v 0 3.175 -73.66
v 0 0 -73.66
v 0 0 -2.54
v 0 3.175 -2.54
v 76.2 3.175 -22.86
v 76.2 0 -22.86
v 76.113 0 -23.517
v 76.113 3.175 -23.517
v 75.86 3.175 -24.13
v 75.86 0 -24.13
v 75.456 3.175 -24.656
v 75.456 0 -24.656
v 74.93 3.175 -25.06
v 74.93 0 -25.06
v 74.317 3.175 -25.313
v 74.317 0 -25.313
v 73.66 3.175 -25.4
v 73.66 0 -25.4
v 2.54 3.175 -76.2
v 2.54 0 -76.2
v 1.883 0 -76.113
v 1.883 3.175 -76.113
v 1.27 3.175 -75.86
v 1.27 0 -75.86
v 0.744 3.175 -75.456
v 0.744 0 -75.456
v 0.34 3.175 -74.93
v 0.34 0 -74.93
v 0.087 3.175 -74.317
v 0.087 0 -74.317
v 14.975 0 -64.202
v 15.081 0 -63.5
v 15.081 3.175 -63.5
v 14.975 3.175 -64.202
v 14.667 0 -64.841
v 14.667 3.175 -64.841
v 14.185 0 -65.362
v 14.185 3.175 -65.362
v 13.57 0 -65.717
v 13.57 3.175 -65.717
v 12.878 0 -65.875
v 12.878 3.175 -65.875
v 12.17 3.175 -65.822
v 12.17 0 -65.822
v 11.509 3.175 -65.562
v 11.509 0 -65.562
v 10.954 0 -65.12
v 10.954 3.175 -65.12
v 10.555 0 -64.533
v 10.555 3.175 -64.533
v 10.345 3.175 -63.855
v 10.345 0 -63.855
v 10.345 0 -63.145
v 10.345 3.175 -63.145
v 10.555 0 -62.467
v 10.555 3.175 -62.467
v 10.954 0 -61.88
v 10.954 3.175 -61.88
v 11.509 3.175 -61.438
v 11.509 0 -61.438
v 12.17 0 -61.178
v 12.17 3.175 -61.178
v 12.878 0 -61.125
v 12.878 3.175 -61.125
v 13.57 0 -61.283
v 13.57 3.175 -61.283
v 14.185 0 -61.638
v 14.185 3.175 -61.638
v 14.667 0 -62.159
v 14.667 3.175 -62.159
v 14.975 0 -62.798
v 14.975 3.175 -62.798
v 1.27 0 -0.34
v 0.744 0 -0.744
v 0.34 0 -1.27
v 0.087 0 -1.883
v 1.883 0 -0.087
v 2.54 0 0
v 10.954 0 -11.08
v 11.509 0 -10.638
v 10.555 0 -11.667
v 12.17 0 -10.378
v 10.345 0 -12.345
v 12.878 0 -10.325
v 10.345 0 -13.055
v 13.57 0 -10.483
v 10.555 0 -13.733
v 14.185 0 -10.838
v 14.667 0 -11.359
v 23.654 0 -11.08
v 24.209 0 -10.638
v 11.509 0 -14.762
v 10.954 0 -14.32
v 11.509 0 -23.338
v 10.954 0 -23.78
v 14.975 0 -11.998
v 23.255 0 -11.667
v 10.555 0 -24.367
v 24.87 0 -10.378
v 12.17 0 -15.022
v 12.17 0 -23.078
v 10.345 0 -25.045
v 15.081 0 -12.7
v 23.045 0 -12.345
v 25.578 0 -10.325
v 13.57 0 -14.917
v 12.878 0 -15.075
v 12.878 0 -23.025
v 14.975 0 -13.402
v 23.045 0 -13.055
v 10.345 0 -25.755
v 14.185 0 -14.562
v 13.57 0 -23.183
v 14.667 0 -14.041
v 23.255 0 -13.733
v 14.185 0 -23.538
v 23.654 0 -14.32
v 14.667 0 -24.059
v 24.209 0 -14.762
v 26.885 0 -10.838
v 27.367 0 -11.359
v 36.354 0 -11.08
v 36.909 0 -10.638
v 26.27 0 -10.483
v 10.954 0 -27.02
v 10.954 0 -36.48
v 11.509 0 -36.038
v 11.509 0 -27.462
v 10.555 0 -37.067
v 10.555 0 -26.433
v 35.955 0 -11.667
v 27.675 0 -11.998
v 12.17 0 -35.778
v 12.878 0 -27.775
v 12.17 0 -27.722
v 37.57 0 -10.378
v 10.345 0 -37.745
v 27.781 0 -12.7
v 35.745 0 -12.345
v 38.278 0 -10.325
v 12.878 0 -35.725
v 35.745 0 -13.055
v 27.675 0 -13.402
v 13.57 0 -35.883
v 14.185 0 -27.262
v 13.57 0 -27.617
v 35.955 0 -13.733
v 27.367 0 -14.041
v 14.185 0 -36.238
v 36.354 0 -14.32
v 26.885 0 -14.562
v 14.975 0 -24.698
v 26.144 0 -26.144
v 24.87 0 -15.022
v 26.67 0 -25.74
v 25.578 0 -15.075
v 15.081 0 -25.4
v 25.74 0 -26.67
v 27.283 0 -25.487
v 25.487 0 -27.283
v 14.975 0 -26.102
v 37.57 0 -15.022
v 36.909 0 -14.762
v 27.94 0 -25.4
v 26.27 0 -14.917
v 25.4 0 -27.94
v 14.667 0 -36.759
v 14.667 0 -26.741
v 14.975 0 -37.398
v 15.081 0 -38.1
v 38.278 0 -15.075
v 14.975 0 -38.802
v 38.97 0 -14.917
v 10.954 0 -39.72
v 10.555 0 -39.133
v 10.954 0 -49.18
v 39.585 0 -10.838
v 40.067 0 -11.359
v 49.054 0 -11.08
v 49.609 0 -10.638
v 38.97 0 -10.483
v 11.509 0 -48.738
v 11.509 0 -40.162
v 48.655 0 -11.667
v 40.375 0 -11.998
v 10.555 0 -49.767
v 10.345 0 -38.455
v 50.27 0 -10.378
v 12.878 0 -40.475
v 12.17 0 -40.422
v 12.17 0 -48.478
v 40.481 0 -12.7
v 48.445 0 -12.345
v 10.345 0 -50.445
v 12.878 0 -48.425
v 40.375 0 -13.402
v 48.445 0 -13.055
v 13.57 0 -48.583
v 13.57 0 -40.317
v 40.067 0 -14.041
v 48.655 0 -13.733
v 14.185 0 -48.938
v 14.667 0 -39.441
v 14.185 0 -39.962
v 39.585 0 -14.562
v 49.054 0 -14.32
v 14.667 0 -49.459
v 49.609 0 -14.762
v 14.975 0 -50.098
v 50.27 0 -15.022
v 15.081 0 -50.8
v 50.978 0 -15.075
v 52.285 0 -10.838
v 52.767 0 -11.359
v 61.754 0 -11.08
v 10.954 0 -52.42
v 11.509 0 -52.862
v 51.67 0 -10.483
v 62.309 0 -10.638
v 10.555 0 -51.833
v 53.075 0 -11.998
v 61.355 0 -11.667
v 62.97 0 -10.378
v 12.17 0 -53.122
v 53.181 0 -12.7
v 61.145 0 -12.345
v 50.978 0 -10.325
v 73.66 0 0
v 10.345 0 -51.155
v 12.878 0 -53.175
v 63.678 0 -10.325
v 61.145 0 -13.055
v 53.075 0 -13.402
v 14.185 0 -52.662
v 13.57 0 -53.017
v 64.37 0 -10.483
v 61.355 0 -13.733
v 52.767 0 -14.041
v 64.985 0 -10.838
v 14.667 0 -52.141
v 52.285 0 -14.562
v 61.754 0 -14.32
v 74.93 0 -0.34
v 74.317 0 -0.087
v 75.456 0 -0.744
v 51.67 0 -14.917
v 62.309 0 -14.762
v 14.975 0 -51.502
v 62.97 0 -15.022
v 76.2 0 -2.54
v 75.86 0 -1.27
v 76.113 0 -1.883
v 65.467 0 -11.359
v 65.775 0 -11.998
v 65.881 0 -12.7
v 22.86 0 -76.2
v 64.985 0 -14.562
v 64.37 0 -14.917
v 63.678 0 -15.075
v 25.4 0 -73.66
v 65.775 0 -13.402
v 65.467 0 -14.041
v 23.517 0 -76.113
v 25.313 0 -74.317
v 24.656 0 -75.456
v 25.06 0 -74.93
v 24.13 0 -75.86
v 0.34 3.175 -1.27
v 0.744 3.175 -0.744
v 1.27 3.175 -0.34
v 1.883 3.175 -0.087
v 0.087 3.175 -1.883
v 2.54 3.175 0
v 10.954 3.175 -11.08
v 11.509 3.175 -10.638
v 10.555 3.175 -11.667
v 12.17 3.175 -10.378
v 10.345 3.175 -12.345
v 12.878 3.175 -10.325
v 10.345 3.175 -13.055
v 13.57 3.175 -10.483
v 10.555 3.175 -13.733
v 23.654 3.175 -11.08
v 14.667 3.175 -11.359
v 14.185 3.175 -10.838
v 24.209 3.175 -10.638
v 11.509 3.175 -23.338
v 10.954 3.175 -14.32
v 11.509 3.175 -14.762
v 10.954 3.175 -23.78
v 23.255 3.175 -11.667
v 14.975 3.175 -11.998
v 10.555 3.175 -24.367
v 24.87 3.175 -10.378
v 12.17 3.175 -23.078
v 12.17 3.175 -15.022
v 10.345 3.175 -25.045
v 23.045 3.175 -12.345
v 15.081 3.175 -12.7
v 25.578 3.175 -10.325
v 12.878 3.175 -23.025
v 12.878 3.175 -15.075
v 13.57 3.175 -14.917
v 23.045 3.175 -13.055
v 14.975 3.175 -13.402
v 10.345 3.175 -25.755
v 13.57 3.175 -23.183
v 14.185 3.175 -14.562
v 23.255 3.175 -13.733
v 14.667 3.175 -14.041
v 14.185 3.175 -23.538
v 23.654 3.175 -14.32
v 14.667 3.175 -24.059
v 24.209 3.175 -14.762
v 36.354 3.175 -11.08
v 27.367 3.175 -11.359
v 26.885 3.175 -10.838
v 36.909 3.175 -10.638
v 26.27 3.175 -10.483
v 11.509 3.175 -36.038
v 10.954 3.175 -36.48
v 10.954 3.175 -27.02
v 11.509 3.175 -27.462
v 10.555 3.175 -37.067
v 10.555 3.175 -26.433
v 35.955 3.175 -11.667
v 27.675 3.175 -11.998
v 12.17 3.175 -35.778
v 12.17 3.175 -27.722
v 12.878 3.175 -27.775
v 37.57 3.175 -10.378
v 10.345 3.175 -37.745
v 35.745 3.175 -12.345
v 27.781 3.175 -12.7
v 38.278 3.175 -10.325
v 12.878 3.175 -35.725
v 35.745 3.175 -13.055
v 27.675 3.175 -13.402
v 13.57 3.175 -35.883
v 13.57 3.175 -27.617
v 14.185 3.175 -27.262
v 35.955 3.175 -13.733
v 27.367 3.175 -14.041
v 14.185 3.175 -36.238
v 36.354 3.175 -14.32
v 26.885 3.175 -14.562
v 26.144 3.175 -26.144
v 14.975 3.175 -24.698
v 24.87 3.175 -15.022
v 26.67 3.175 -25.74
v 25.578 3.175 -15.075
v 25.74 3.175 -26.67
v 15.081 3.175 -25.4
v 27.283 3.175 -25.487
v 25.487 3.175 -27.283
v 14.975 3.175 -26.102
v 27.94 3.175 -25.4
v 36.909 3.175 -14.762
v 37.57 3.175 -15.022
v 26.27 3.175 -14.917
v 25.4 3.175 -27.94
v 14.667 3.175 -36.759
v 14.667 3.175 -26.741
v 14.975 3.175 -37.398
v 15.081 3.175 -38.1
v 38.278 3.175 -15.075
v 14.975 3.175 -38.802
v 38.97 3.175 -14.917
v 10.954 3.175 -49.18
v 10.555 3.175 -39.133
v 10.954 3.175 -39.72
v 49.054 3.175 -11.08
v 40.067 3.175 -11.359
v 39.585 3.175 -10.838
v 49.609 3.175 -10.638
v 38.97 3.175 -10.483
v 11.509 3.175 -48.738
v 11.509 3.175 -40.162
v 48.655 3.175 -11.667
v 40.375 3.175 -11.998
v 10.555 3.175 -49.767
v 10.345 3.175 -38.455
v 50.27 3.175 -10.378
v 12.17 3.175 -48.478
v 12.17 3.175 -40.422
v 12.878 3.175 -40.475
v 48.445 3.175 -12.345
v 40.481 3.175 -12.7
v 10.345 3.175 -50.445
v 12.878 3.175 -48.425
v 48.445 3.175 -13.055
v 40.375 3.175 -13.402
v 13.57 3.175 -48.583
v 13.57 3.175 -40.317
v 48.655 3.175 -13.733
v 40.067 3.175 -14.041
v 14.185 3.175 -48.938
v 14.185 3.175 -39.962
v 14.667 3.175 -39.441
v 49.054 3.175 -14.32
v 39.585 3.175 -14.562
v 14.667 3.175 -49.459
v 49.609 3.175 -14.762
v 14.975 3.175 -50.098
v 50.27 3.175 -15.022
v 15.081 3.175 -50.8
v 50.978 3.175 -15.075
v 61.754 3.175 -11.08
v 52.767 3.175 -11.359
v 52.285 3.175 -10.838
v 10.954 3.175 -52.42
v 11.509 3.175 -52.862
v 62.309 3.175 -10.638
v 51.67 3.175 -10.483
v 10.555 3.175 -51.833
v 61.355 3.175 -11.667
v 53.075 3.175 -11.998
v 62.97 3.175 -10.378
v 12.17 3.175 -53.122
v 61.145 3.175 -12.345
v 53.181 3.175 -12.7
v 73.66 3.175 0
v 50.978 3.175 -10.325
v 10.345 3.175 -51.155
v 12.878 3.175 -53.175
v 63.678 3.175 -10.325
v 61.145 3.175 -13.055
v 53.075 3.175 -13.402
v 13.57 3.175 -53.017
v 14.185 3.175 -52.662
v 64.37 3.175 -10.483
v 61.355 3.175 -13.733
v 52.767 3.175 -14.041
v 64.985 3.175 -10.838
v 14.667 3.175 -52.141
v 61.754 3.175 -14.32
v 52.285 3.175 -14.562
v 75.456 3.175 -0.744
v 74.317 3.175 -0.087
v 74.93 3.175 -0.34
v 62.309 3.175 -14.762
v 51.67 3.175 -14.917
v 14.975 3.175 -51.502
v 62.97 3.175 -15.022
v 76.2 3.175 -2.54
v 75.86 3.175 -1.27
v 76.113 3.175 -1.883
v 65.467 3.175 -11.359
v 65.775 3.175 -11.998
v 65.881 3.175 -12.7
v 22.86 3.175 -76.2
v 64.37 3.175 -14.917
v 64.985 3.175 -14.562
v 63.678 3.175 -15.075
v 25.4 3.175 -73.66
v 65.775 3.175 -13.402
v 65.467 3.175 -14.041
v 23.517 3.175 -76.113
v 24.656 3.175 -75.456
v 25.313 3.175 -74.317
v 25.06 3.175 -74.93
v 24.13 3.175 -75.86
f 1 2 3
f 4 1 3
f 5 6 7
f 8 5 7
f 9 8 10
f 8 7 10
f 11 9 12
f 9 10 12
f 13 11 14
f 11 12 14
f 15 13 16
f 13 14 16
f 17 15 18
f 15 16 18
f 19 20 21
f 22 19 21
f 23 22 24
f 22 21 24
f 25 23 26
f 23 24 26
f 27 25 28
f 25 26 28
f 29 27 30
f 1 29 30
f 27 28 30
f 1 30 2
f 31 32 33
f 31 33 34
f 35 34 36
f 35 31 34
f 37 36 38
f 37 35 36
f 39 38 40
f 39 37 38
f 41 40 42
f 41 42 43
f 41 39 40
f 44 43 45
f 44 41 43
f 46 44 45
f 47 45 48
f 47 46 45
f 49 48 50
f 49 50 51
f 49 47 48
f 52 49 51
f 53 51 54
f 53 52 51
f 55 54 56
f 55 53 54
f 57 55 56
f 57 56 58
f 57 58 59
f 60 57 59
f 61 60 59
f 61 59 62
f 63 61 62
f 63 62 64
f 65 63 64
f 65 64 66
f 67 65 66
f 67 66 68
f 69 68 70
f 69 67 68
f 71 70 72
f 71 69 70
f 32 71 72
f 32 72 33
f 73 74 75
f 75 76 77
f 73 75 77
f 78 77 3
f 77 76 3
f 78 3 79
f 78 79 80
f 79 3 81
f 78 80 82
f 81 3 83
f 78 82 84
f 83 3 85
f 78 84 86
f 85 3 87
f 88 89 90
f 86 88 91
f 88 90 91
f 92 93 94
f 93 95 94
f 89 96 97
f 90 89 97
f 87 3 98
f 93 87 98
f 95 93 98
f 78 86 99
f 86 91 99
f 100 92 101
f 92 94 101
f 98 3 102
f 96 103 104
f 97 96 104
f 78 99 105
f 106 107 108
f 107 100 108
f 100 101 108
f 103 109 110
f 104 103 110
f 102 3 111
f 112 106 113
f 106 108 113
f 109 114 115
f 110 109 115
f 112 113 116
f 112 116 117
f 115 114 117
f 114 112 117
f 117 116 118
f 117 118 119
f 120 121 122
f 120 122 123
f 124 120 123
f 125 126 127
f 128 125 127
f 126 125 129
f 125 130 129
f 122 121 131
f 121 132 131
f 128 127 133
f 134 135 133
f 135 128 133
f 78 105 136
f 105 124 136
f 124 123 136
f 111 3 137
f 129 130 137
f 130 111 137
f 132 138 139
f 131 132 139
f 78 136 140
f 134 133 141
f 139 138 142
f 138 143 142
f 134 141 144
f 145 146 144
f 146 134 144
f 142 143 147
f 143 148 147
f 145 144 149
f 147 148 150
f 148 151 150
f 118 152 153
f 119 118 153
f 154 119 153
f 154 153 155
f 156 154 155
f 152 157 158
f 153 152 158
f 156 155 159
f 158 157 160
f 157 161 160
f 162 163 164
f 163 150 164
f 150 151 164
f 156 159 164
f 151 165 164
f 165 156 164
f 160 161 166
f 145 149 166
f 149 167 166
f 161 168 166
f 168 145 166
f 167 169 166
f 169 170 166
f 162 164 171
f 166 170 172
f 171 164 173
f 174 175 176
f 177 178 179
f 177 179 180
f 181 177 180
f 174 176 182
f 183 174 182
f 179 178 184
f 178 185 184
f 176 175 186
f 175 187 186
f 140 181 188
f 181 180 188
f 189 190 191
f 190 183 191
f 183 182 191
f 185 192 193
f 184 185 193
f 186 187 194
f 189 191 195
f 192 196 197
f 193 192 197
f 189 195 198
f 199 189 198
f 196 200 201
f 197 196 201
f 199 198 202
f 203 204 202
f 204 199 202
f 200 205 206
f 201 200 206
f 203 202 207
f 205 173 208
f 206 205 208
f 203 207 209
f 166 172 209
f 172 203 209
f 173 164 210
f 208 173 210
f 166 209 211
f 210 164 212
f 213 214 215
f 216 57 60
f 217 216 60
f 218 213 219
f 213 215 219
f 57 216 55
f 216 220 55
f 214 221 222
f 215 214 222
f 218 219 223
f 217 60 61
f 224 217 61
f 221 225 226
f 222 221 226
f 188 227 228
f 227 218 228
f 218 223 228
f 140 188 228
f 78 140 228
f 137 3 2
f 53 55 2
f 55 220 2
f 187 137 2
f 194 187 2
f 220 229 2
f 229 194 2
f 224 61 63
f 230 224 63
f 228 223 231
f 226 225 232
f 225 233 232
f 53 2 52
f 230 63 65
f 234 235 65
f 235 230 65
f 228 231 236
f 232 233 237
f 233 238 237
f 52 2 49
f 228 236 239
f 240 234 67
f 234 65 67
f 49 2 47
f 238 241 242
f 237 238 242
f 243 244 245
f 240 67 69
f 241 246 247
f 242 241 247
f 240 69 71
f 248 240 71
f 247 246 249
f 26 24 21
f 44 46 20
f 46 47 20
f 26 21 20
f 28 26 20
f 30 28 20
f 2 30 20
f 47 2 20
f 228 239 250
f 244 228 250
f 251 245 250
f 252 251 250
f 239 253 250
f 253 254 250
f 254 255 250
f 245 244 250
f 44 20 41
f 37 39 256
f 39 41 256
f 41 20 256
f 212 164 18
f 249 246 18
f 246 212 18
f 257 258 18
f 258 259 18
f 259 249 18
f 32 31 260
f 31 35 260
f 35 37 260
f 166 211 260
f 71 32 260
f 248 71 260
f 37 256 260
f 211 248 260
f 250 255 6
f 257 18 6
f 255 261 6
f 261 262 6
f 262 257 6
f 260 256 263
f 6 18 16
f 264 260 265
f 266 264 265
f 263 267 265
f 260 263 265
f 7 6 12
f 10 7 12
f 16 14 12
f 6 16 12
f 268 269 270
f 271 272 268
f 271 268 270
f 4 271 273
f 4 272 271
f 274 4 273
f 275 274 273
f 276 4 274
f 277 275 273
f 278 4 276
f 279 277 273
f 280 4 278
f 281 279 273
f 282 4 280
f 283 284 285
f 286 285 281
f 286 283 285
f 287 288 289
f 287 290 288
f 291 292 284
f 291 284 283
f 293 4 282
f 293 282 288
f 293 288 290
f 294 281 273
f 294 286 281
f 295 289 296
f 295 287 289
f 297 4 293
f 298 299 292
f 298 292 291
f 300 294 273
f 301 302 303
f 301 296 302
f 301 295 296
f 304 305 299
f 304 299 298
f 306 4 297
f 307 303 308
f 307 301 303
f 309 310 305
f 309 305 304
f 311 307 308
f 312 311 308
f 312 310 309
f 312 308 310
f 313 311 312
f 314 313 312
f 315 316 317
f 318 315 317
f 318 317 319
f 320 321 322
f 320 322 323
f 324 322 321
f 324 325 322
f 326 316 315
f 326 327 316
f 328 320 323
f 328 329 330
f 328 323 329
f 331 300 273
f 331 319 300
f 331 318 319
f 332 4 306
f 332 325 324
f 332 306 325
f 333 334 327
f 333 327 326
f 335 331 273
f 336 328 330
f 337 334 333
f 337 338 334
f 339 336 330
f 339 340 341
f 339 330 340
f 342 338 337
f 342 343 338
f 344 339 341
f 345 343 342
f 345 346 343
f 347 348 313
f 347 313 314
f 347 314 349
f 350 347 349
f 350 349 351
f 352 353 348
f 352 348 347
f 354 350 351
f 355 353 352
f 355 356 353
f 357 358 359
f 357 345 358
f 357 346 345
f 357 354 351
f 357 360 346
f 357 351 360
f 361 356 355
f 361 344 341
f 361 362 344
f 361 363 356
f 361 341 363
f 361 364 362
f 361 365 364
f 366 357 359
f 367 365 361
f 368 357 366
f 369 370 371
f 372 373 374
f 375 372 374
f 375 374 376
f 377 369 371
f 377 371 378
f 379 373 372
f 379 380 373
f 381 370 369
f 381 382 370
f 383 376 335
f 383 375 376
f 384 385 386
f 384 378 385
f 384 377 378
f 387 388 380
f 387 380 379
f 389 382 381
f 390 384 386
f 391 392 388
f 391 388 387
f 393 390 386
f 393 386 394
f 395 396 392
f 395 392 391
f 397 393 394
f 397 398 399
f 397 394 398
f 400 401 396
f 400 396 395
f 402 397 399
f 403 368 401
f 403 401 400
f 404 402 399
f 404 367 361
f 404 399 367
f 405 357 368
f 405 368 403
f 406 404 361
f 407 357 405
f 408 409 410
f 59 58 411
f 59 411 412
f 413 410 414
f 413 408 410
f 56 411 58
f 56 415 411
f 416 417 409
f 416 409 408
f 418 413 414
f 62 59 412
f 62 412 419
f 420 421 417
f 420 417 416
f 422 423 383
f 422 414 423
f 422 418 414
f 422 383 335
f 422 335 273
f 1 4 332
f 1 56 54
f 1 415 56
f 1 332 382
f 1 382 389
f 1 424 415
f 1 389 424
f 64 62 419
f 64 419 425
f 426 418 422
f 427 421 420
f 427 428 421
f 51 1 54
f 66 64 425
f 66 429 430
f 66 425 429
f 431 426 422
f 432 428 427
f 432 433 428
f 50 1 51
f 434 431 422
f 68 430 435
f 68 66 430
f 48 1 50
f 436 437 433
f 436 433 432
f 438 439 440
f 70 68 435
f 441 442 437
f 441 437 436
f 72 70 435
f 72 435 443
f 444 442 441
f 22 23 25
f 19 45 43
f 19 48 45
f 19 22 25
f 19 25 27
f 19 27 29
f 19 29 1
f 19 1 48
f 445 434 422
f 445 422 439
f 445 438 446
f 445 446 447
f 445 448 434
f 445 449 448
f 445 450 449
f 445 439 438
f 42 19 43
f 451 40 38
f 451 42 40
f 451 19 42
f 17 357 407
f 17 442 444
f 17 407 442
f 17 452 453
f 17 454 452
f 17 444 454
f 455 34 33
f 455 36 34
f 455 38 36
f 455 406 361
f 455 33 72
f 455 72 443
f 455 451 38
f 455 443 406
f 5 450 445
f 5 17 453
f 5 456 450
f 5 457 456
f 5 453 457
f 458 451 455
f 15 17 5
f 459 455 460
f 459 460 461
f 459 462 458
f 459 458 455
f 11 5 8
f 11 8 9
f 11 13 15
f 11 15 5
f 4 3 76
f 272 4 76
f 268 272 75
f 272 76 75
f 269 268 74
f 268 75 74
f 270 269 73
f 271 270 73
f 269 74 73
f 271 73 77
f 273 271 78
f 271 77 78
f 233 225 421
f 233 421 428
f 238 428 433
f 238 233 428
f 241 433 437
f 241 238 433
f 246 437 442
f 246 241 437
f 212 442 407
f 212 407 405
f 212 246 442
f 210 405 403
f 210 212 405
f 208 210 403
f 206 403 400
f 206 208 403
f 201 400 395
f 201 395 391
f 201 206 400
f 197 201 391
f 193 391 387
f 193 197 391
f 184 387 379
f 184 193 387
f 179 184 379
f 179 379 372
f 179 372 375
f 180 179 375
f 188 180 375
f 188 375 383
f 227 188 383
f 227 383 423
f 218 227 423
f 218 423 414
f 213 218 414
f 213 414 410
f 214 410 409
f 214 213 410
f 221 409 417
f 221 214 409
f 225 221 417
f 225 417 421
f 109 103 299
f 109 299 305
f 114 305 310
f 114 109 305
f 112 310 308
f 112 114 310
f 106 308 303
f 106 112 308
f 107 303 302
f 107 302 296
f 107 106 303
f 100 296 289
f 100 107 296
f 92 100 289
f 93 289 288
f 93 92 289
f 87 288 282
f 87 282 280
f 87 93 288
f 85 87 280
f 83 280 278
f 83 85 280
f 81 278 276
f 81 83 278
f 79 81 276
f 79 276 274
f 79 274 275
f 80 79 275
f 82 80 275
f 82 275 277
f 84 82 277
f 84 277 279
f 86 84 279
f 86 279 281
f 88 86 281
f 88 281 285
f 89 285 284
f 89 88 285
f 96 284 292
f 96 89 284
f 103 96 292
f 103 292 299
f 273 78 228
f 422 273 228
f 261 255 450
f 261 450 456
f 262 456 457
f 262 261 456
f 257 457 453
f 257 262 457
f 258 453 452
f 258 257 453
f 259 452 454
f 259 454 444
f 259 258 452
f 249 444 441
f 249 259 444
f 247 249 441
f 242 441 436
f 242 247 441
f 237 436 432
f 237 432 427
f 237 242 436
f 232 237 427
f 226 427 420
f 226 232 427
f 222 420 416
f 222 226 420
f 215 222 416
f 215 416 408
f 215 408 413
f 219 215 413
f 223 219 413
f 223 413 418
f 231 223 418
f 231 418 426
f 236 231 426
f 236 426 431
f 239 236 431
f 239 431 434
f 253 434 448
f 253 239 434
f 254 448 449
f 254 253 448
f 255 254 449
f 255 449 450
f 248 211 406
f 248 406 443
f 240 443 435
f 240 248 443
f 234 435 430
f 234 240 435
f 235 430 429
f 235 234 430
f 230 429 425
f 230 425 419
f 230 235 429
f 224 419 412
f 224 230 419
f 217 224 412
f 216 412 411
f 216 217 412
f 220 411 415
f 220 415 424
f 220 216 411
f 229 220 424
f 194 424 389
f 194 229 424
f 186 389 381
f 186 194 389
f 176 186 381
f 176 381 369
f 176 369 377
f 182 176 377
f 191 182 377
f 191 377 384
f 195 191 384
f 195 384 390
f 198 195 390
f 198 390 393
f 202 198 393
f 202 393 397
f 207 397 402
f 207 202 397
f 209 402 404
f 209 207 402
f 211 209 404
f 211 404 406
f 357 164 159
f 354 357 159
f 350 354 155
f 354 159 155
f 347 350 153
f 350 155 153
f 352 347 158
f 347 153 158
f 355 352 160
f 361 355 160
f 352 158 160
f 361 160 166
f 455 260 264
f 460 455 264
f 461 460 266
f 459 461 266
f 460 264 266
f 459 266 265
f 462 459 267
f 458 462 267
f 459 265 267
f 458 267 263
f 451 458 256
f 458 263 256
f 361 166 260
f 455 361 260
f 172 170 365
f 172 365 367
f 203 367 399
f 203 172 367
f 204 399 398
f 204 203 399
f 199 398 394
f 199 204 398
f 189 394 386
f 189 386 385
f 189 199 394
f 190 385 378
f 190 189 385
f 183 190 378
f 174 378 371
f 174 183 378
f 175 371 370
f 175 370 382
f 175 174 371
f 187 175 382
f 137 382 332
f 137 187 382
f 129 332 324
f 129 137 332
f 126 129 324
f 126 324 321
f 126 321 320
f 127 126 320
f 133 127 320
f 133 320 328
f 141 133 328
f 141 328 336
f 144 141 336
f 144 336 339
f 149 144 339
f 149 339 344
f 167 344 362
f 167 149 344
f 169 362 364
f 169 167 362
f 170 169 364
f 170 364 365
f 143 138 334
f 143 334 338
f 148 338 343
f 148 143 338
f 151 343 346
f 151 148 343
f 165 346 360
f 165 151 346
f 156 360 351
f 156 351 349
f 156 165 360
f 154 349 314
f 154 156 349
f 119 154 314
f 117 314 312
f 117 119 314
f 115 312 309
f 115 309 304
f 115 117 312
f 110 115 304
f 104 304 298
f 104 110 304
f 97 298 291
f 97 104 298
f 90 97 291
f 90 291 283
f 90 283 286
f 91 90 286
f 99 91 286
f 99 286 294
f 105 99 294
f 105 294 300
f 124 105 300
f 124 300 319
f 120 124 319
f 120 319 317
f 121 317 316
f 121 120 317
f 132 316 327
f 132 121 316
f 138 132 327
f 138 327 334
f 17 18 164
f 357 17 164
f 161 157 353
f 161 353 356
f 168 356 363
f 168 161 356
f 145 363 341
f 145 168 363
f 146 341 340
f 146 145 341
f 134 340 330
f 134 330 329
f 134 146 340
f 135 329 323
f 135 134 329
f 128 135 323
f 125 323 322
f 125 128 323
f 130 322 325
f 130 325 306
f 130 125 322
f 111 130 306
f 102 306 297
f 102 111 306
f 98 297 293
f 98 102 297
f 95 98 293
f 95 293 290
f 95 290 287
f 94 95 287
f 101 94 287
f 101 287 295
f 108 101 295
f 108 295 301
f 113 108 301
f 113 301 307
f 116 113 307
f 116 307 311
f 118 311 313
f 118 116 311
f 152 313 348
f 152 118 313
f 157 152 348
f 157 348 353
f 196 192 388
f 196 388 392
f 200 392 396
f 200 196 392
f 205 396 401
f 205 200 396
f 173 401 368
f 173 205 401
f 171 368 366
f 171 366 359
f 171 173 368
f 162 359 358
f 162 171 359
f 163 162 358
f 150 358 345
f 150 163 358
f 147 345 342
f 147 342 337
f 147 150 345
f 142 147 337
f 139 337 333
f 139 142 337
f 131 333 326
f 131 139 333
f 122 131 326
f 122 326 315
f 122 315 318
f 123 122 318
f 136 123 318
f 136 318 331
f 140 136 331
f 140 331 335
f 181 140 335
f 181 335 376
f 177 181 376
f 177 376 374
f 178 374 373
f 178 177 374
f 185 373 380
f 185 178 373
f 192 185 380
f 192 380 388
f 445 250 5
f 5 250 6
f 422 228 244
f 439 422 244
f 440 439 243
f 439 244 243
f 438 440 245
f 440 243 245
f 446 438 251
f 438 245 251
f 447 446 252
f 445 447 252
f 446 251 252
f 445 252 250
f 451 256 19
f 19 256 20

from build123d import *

# Parameters (mm, degrees)
SKETCH1_R           = 2.38125
BOSS_EXTRUDE1_DEPTH = 3.175


with BuildPart() as part:
    # Sketch1 → Boss-Extrude1 (new body)
    with BuildSketch(Plane(origin=(0, 0, 0), x_dir=(1, 0, 0), z_dir=(0, 1, 0))):
        with BuildLine():
            ThreePointArc((0, 2.54), (0.743948776, 0.743948776), (2.54, 0))
            Line((2.54, 0), (25.4, 0))
            Line((25.4, 0), (73.66, 0))
            ThreePointArc((73.66, 0), (75.456051224, 0.743948776), (76.2, 2.54))
            Line((76.2, 2.54), (76.2, 22.86))
            ThreePointArc((76.2, 22.86), (75.456051224, 24.656051224), (73.66, 25.4))
            Line((73.66, 25.4), (27.94, 25.4))
            ThreePointArc((27.94, 25.4), (26.143948776, 26.143948776), (25.4, 27.94))
            Line((25.4, 27.94), (25.4, 73.66))
            ThreePointArc((25.4, 73.66), (24.656051224, 75.456051224), (22.86, 76.2))
            Line((22.86, 76.2), (2.54, 76.2))
            ThreePointArc((2.54, 76.2), (0.743948776, 75.456051224), (0, 73.66))
            Line((0, 73.66), (0, 25.4))
            Line((0, 25.4), (0, 2.54))
        make_face()
        with Locations((12.7, 12.7)):
            Circle(SKETCH1_R, mode=Mode.SUBTRACT)
        with Locations((25.4, 12.7)):
            Circle(SKETCH1_R, mode=Mode.SUBTRACT)
        with Locations((38.1, 12.7)):
            Circle(SKETCH1_R, mode=Mode.SUBTRACT)
        with Locations((12.7, 25.4)):
            Circle(SKETCH1_R, mode=Mode.SUBTRACT)
        with Locations((12.7, 38.1)):
            Circle(SKETCH1_R, mode=Mode.SUBTRACT)
        with Locations((50.8, 12.7)):
            Circle(SKETCH1_R, mode=Mode.SUBTRACT)
        with Locations((63.5, 12.7)):
            Circle(SKETCH1_R, mode=Mode.SUBTRACT)
        with Locations((12.7, 50.8)):
            Circle(SKETCH1_R, mode=Mode.SUBTRACT)
        with Locations((12.7, 63.5)):
            Circle(SKETCH1_R, mode=Mode.SUBTRACT)
    extrude(amount=BOSS_EXTRUDE1_DEPTH)


solid = part.part
